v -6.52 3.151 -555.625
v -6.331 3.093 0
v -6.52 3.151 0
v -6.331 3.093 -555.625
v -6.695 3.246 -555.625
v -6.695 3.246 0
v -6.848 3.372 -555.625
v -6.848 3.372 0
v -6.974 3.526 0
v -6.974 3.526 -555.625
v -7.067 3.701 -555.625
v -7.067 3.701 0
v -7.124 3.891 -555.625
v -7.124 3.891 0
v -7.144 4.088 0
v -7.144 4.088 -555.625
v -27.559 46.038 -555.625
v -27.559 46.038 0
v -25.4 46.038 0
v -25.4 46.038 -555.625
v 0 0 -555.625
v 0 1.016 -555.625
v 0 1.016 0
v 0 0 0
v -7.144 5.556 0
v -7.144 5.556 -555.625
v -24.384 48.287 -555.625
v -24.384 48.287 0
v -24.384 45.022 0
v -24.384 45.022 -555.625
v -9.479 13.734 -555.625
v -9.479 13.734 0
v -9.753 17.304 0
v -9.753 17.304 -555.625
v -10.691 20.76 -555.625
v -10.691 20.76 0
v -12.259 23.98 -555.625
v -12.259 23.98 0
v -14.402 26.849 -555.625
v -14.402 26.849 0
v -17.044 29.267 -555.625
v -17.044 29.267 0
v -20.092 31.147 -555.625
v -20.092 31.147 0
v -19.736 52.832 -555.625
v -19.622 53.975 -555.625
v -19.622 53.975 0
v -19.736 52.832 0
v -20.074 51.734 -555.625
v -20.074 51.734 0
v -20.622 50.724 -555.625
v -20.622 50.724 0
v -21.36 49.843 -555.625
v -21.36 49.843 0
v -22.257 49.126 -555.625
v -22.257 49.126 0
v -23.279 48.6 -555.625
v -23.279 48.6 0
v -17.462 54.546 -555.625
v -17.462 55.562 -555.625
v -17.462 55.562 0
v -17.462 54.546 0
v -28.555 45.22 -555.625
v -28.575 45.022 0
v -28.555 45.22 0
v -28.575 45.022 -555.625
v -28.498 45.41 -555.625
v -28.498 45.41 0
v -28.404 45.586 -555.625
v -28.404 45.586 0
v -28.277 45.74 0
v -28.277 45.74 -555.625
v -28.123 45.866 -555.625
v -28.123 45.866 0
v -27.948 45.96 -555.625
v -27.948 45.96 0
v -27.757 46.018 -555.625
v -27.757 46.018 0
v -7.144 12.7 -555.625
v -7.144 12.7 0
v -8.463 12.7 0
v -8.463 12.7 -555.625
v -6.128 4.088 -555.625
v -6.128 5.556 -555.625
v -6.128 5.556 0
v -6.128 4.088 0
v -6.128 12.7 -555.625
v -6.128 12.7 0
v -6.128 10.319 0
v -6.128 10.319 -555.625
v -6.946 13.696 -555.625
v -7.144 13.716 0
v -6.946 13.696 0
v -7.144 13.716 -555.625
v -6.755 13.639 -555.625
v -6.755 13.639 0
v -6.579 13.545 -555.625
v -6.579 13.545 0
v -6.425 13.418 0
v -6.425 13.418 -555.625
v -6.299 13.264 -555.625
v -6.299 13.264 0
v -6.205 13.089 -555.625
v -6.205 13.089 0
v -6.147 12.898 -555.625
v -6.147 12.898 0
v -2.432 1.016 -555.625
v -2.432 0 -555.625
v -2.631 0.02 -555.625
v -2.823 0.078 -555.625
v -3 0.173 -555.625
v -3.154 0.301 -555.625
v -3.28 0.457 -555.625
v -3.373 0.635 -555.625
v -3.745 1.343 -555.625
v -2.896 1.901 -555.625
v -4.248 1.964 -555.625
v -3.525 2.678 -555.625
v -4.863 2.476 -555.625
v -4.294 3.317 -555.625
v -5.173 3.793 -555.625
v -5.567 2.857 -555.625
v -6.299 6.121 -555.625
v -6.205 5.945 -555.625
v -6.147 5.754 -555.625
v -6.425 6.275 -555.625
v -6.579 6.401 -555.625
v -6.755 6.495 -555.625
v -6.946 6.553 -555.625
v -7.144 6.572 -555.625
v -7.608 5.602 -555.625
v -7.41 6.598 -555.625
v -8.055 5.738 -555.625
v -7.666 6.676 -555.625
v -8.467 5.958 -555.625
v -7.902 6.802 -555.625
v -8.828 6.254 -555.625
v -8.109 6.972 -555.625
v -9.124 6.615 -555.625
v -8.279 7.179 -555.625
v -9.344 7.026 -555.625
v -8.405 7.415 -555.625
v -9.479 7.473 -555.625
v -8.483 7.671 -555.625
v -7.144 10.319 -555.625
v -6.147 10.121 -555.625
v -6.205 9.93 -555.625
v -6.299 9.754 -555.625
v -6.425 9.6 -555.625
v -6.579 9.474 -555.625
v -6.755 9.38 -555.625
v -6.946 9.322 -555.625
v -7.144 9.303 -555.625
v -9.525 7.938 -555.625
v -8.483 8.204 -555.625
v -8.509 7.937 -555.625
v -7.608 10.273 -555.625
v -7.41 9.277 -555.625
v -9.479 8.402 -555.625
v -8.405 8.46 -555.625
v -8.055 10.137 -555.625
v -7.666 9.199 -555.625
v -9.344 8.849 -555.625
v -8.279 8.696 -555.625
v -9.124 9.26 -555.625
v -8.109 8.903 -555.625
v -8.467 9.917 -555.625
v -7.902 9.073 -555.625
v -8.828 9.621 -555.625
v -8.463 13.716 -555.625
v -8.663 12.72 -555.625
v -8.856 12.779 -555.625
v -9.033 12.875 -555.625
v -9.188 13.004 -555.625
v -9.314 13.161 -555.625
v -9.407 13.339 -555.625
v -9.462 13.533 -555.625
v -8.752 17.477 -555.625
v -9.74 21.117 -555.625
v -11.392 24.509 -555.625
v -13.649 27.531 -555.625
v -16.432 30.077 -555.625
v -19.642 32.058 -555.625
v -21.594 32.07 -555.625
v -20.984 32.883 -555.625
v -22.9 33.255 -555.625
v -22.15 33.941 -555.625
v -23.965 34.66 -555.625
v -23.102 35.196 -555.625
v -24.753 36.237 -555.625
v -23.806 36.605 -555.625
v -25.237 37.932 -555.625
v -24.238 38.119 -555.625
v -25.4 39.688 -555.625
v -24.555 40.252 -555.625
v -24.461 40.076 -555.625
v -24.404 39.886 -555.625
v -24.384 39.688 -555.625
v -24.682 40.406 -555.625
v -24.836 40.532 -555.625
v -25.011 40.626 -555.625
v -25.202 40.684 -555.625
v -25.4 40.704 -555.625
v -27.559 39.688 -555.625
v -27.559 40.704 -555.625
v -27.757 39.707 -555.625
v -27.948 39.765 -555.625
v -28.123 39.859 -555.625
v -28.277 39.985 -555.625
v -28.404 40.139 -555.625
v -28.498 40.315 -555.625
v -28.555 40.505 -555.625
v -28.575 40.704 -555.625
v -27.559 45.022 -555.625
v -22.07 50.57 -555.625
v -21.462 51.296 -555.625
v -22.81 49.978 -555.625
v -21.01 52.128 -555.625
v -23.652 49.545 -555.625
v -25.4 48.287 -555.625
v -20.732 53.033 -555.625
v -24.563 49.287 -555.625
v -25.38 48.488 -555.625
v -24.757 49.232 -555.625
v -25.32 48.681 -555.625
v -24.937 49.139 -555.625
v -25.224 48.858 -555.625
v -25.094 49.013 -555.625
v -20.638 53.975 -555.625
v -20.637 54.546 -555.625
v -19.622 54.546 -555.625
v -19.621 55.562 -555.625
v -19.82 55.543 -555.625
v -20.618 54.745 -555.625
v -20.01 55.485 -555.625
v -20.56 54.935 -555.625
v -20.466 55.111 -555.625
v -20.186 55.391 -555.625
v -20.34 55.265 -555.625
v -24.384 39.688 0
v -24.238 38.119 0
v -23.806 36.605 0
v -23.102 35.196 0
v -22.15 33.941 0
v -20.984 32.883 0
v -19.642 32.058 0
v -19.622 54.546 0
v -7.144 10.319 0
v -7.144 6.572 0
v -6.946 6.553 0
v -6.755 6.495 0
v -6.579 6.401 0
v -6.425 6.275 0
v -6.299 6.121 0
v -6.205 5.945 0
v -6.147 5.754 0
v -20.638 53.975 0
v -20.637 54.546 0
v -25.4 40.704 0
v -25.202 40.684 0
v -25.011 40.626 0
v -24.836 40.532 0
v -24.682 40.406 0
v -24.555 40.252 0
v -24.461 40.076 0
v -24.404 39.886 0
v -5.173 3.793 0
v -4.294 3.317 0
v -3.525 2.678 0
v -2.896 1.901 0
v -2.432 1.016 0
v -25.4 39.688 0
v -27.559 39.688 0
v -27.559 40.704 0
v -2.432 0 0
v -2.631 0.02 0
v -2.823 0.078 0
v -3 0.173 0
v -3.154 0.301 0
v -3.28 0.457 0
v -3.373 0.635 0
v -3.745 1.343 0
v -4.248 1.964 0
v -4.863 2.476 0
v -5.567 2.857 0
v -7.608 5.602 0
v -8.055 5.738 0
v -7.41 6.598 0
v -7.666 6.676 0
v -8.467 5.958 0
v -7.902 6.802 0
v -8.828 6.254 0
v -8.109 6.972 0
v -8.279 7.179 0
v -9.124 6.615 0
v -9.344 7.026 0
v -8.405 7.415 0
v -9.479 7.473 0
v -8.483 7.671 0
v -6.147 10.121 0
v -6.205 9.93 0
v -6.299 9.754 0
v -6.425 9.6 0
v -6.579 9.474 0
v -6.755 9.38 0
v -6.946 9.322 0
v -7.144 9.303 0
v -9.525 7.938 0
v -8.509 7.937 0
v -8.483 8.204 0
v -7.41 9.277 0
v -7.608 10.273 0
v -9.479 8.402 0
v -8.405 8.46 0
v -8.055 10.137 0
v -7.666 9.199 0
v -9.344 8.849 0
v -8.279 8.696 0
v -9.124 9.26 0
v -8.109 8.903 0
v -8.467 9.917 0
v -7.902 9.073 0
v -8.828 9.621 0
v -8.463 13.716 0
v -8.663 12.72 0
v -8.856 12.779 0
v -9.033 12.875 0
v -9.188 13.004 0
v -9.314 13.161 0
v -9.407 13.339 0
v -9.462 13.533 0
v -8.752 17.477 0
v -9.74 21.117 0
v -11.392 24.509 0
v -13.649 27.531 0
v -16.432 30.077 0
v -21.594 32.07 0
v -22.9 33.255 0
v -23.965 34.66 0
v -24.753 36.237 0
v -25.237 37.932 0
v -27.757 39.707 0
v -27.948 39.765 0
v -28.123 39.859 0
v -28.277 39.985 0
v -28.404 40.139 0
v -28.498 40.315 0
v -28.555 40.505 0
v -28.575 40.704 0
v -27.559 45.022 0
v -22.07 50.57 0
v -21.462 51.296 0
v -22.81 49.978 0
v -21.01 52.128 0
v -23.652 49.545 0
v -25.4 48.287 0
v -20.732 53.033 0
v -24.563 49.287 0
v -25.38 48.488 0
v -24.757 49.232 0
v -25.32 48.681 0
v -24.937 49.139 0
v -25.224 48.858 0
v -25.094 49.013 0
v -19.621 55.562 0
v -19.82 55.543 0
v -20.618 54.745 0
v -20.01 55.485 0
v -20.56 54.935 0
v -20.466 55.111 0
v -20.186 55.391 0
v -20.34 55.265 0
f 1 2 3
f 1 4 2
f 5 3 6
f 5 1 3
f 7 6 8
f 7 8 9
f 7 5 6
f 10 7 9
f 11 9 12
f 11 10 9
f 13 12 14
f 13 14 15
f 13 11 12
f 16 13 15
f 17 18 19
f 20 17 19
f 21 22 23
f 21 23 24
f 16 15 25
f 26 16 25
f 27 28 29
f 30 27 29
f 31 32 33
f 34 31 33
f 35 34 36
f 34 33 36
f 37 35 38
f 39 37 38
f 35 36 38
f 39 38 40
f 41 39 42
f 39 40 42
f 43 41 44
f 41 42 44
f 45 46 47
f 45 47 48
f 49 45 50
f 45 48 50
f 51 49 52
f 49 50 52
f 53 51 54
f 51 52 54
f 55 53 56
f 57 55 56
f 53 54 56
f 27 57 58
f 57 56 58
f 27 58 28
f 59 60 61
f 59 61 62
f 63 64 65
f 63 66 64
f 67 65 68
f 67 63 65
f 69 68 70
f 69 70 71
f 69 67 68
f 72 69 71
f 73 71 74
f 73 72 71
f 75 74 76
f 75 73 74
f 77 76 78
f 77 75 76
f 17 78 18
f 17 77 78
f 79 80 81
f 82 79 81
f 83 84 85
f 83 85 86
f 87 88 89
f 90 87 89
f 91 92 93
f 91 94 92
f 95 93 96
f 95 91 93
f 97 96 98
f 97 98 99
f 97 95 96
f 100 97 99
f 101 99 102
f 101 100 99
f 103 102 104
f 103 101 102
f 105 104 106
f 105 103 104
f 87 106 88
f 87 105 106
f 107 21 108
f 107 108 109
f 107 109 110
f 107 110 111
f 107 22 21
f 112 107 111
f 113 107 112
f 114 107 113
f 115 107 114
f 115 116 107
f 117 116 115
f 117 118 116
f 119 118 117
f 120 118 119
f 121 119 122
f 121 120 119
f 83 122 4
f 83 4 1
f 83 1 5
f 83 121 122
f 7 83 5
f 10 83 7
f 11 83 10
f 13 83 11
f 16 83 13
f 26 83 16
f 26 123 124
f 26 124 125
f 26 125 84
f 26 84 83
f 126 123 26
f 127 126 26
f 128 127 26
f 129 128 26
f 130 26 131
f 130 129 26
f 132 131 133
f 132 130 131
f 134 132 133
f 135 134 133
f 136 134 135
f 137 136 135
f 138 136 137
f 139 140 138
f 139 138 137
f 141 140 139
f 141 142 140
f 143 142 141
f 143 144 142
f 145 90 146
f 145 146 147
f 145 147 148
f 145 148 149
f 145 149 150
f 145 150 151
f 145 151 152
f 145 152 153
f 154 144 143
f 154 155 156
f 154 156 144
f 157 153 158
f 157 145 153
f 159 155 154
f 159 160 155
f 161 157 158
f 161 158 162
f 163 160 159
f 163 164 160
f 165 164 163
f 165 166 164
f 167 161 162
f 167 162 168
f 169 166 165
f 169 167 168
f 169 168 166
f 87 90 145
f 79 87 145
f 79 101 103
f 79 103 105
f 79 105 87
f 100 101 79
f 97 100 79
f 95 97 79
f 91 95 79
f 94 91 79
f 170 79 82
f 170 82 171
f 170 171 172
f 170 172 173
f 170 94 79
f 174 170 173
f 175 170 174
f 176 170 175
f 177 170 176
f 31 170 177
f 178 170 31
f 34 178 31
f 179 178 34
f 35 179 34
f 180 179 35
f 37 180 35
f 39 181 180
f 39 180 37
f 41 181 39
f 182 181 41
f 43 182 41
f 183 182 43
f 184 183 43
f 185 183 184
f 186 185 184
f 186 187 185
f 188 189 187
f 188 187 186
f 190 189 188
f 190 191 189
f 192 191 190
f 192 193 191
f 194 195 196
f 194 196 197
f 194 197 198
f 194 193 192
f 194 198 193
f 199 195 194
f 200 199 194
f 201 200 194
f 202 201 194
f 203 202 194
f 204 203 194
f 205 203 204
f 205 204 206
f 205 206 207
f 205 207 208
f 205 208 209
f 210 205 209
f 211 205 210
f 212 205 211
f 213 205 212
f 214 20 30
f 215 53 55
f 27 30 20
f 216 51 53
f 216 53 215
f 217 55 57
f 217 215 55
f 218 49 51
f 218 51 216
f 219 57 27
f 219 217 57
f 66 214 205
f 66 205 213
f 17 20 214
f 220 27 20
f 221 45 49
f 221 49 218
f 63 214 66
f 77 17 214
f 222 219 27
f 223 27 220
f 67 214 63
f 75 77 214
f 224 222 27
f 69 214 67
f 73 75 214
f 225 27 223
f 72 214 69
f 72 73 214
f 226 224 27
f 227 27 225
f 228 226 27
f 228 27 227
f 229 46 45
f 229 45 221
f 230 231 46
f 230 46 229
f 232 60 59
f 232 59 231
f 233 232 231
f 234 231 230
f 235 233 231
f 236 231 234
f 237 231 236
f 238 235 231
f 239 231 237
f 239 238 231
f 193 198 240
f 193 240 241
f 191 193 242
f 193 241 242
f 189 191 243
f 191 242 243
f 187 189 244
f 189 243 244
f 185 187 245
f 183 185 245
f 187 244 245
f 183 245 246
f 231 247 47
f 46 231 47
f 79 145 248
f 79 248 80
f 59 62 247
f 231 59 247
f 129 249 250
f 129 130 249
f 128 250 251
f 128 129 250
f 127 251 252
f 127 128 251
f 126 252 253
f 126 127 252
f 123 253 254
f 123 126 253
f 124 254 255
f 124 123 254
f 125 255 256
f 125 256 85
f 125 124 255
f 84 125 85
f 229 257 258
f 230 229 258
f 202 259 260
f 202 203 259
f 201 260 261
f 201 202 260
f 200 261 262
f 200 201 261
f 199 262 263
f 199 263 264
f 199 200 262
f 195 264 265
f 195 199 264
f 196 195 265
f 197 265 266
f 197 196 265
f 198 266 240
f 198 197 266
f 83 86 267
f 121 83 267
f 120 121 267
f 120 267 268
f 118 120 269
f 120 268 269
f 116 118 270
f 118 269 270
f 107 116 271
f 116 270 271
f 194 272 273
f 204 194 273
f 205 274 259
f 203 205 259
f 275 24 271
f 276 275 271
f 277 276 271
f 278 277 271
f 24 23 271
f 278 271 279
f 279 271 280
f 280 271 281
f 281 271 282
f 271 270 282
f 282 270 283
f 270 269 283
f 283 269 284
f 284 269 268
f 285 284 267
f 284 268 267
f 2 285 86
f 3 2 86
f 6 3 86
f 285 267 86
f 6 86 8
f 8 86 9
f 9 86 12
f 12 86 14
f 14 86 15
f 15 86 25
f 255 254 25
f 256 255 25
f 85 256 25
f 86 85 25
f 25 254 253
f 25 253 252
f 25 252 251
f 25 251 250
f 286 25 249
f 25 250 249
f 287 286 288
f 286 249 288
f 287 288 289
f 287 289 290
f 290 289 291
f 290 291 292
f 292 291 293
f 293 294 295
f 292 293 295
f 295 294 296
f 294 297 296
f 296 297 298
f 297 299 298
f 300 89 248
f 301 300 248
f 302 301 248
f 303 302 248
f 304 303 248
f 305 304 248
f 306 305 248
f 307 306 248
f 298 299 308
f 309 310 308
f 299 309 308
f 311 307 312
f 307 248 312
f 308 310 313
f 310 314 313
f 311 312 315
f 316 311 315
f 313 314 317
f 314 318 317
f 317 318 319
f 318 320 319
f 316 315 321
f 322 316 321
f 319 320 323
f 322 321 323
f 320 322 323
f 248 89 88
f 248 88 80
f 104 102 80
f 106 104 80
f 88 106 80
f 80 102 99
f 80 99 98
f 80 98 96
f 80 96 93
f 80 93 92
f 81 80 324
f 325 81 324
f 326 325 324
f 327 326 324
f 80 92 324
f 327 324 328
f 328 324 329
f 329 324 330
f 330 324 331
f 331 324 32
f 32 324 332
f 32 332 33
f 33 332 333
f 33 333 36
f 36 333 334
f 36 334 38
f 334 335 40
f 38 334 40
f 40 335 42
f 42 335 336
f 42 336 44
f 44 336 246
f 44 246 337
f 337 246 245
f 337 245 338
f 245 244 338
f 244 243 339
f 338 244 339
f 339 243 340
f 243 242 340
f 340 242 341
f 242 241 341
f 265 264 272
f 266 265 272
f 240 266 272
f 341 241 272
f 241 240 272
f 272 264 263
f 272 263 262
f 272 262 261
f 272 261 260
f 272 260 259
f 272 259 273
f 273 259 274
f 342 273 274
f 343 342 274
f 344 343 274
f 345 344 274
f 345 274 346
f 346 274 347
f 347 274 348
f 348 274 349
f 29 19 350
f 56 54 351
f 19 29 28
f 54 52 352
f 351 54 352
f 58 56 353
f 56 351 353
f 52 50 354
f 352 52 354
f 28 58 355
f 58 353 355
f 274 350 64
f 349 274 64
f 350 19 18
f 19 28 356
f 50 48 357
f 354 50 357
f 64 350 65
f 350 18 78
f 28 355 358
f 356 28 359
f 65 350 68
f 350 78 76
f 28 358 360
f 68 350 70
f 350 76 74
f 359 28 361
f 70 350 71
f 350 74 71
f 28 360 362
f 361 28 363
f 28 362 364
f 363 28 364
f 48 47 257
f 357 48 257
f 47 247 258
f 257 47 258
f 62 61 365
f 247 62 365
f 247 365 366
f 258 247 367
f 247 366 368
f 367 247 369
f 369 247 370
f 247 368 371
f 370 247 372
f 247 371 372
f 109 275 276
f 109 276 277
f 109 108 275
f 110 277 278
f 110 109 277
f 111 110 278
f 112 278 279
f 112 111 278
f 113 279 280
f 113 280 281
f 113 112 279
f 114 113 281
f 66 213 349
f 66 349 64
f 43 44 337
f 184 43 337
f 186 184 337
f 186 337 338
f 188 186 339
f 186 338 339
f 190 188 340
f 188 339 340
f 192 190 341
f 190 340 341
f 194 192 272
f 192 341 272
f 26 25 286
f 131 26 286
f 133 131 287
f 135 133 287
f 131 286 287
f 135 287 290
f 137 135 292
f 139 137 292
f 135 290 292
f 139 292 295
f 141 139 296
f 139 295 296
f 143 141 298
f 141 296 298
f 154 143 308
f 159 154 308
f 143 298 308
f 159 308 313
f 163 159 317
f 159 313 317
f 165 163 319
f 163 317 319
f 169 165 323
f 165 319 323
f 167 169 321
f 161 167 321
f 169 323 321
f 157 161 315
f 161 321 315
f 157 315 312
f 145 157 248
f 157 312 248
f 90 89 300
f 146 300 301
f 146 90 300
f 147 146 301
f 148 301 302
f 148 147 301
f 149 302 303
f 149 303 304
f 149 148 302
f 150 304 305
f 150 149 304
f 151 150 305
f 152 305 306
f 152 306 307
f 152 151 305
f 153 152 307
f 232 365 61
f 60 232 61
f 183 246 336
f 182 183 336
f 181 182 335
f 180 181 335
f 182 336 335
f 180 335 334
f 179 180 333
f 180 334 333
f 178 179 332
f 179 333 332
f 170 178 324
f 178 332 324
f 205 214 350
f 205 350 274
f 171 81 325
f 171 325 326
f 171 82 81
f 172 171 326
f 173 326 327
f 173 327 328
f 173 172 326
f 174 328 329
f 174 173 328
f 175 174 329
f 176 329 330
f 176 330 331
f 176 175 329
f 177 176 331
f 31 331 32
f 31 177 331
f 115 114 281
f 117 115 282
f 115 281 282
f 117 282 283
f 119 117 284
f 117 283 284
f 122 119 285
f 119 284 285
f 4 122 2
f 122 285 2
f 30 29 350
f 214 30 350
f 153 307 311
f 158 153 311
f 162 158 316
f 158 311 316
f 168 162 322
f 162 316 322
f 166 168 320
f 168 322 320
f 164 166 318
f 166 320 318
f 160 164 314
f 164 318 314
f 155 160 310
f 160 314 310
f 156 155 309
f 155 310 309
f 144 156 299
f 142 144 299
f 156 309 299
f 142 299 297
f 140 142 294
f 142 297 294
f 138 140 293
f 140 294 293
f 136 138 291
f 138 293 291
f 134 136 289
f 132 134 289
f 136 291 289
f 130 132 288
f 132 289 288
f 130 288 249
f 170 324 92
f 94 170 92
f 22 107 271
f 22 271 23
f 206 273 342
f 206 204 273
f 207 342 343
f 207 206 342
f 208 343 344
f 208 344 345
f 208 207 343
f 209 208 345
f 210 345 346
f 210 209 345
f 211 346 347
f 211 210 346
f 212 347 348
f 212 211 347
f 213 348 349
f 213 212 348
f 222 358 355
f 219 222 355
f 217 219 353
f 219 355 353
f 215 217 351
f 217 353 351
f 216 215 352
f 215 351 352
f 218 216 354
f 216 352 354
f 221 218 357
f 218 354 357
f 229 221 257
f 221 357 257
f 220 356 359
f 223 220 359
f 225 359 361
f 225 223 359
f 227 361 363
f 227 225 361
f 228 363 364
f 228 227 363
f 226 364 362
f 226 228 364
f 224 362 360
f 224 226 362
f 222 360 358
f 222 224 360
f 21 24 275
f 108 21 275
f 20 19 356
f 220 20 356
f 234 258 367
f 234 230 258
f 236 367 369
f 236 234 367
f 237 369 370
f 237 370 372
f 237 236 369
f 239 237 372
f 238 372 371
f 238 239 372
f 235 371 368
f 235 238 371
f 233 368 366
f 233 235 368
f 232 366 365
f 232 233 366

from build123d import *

# Parameters (mm, degrees)
EXTRUDE_THIN1_DEPTH = 555.625
FILLET1_R           = 1.016


with BuildPart() as part:
    # Sketch1 → Extrude-Thin1 (new body)
    with BuildSketch(Plane.XY):
        with BuildLine():
            Line((0, 0), (-3.175, 0))
            ThreePointArc((-3.175, 0), (-4.60251, 2.283581), (-7.14375, 3.175))
            Line((-7.14375, 3.175), (-7.14375, 5.55625))
            ThreePointArc((-7.14375, 5.55625), (-9.525, 7.9375), (-7.14375, 10.31875))
            Line((-7.14375, 10.31875), (-7.14375, 12.7))
            Line((-7.14375, 12.7), (-9.525, 12.7))
            ThreePointArc((-9.525, 12.7), (-11.995981, 23.534537), (-20.091997, 31.146858))
            ThreePointArc((-20.091997, 31.146858), (-23.964886, 34.659641), (-25.4, 39.6875))
            Line((-25.4, 39.6875), (-28.575, 39.6875))
            Line((-28.575, 39.6875), (-28.575, 46.0375))
            Line((-28.575, 46.0375), (-25.4, 46.0375))
            Line((-25.4, 46.0375), (-25.4, 49.2125))
            ThreePointArc((-25.4, 49.2125), (-22.032404, 50.607404), (-20.6375, 53.975))
            Line((-20.6375, 53.975), (-20.6375, 55.5625))
            Line((-20.6375, 55.5625), (-17.4625, 55.5625))
            Line((-17.4625, 55.5625), (-17.4625, 54.5465))
            Line((-17.4625, 54.5465), (-19.6215, 54.5465))
            Line((-19.6215, 54.5465), (-19.6215, 53.975))
            ThreePointArc((-19.6215, 53.975), (-20.969311, 50.265545), (-24.384, 48.28652))
            Line((-24.384, 48.28652), (-24.384, 45.0215))
            Line((-24.384, 45.0215), (-27.559, 45.0215))
            Line((-27.559, 45.0215), (-27.559, 40.7035))
            Line((-27.559, 40.7035), (-24.323126, 40.7035))
            ThreePointArc((-24.323126, 40.7035), (-23.357661, 35.636221), (-19.642184, 32.05786))
            ThreePointArc((-19.642184, 32.05786), (-11.391678, 24.508737), (-8.463037, 13.716))
            Line((-8.463037, 13.716), (-6.12775, 13.716))
            Line((-6.12775, 13.716), (-6.12775, 8.849449))
            ThreePointArc((-6.12775, 8.849449), (-8.509, 7.9375), (-6.12775, 7.025551))
            Line((-6.12775, 7.025551), (-6.12775, 4.088445))
            ThreePointArc((-6.12775, 4.088445), (-3.893771, 3.016555), (-2.431789, 1.016))
            Line((-2.431789, 1.016), (0, 1.016))
            Line((0, 1.016), (0, 0))
        make_face()
    extrude(amount=-EXTRUDE_THIN1_DEPTH)

    # Fillet1
    fillet1_edges = [part.edges().sort_by_distance(p)[0] for p in [
        (-24.323126, 40.7035, -277.8125),
        (-6.12775, 13.716, -277.8125),
        (-6.12775, 8.849449, -277.8125),
        (-6.12775, 7.025551, -277.8125),
        (-3.175, 0, -277.8125),
        (-7.14375, 3.175, -277.8125),
        (-9.525, 12.7, -277.8125),
        (-28.575, 39.6875, -277.8125),
        (-28.575, 46.0375, -277.8125),
        (-25.4, 49.2125, -277.8125),
        (-20.6375, 55.5625, -277.8125),
    ]]
    fillet(fillet1_edges, radius=FILLET1_R)


solid = part.part
